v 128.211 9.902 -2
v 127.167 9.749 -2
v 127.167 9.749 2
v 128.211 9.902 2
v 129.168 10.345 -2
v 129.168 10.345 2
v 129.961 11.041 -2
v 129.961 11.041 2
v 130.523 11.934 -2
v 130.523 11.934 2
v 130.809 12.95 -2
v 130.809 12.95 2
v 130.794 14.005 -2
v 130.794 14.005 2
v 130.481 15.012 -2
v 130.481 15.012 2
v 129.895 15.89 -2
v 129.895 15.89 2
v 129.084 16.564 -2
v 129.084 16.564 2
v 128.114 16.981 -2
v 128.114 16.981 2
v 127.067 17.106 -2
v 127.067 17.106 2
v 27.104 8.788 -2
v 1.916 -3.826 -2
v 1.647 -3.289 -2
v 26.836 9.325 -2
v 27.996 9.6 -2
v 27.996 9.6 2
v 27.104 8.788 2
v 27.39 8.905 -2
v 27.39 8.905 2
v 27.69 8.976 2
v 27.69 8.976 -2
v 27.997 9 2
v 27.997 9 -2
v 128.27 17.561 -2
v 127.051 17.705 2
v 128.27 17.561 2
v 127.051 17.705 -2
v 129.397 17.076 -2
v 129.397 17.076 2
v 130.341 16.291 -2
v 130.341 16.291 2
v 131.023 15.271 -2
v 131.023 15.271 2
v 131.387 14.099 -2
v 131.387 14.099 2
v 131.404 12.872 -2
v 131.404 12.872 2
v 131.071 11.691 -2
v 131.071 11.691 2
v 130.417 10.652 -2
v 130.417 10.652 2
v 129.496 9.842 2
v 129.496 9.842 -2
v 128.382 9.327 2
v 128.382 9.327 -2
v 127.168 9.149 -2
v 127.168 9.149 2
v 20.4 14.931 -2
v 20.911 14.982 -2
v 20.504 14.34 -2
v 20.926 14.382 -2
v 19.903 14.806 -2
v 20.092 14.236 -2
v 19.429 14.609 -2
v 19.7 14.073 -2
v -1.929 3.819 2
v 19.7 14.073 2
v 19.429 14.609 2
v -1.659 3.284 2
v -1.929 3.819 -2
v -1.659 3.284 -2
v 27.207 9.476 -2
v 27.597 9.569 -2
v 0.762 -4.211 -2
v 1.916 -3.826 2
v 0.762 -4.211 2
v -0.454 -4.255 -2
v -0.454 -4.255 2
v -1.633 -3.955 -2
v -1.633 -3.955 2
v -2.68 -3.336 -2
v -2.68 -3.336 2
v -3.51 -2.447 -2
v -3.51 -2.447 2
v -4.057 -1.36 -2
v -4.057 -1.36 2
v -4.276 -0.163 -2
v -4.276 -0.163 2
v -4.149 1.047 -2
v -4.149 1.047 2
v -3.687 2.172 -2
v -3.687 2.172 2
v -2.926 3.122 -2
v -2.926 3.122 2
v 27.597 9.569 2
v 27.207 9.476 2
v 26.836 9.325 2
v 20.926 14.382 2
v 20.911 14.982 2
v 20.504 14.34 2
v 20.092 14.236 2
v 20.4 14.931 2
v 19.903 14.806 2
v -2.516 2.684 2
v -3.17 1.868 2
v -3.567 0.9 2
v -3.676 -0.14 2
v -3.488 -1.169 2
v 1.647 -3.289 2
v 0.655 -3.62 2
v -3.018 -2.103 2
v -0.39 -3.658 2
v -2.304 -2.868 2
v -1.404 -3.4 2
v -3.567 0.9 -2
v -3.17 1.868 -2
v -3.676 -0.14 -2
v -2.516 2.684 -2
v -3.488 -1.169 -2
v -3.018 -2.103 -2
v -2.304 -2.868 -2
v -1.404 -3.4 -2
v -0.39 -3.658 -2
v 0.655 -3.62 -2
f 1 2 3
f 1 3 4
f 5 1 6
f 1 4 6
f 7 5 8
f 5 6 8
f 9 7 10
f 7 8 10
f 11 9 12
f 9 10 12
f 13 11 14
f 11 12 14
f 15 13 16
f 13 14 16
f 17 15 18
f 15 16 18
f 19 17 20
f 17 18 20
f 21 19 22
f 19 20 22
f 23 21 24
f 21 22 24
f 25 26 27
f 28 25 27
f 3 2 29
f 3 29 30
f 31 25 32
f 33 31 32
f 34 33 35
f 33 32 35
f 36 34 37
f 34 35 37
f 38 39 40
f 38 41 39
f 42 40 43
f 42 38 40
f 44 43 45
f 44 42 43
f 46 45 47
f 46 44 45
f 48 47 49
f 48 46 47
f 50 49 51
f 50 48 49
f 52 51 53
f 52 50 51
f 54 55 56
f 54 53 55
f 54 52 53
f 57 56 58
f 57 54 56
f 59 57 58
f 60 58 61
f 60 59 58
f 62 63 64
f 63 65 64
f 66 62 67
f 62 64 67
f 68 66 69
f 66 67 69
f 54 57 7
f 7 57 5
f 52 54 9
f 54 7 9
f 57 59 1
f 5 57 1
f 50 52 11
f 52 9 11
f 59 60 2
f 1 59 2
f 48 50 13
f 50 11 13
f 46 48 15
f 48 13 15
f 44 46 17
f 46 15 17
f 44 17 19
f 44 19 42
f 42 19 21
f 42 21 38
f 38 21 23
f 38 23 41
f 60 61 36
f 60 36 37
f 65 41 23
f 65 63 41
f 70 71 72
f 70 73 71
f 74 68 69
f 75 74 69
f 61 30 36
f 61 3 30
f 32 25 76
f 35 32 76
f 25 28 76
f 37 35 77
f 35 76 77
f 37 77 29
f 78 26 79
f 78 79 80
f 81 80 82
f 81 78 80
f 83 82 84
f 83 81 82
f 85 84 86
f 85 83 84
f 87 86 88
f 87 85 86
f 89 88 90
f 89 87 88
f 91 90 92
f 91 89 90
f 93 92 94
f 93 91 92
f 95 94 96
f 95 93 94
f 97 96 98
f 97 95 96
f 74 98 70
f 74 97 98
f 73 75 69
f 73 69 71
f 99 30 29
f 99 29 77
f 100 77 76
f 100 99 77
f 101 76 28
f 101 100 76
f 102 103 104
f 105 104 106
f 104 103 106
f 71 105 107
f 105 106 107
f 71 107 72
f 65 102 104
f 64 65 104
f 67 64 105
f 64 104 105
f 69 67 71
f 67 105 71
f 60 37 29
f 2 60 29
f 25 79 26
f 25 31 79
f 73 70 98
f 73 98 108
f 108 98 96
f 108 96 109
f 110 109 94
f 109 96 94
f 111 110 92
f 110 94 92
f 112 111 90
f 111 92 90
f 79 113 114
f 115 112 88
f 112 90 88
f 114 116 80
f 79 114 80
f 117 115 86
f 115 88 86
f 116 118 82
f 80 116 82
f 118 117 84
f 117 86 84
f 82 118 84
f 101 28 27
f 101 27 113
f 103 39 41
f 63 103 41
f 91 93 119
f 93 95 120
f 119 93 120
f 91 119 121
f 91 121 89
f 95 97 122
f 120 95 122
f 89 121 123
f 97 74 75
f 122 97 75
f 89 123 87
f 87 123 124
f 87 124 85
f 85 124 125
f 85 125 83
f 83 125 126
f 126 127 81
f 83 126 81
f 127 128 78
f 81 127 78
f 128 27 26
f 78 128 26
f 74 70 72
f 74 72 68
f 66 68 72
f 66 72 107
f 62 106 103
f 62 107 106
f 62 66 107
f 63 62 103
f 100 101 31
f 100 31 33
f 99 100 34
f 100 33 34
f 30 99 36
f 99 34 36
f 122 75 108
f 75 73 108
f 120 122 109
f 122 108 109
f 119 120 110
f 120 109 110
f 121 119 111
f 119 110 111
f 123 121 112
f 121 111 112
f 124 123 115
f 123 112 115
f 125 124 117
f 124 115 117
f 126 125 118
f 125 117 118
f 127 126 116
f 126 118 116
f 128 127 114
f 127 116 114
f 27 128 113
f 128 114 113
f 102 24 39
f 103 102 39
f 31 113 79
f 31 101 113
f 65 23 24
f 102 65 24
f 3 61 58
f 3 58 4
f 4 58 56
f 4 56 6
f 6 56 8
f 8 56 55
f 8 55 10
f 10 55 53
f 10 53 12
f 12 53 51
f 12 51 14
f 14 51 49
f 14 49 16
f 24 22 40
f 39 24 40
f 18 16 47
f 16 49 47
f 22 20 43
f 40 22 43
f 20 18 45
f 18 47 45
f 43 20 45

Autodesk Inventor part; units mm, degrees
sketch "Skizzenpfad" plane through (0, 0, 0) normal (0, 0, 1) x (1, 0, 0)
  arc A0 (20.91835, 14.682051) -> (19.564749, 14.341157) centre (21, 11.5) ccw
  arc A1 (127.167049, 9.449131) -> (127.059003, 17.405564) centre (127.161065, 13.428) ccw
  arc A2 (27.996541, 9.299997) -> (26.970103, 9.056529) centre (28, 7) ccw
  arc A3 (-1.794064, 3.551446) -> (1.781665, -3.557682) centre (0, 0) ccw
  line L0 (-1.794064, 3.551446) -> (19.564749, 14.341157)
  line L1 (20.91835, 14.682051) -> (127.059003, 17.405564)
  line L2 (127.167049, 9.449131) -> (27.996541, 9.299997)
  line L3 (26.970103, 9.056529) -> (1.781665, -3.557682)
ref_plane "Querschnittsebene" through (19.564749, 14.341157, 0) normal (-0.8925758, -0.4508975, 0) x (0, 0, 1)
ref_plane "Arbeitsebene2" through (21, 11.5, 0) normal (-1, 0, 0) x (0, 0, 1)
ref_plane "Arbeitsebene3" through (127.161065, 13.428, 0) normal (-0.9467755, 0.3218947, 0) x (0, 0, 1)
ref_plane "Arbeitsebene4" through (0, 0, 0) normal (0.9748553, 0.2228388, 0) x (0, 0, 1)
sketch "Querschnitt" plane through (19.564749, 14.341157, 0) normal (-0.8925758, -0.4508975, 0) x (0, 0, 1)
  line L0 (-2, 0.3) -> (2, 0.3)
  line L1 (2, 0.3) -> (2, -0.3)
  line L2 (2, -0.3) -> (-2, -0.3)
  line L3 (-2, -0.3) -> (-2, 0.3)
  line L4 (-2, 0) -> (2, 0) construction
  point P0 (0, 0)
  point P1 (0, 0)
  dimension "d0" = 4
  dimension "d4" = 0.3
  dimension "d5" = 0.3
sweep "Riemen" add profiles "Querschnitt" path "Skizzenpfad"
equation "\"d0\" = da_B"
equation "\"d4\" = da_a"
equation "\"d5\" = da_a2"
equation "\"da_B\" = 4"
equation "\"da_pb\" = 2.5"
equation "\"da_L\" = 285"
equation "\"da_a\" = 0.3"
equation "\"da_S\" = 1.5"
equation "\"da_Beta\" = 20deg"
equation "\"da_Ht\" = 0.7"
equation "\"da_H\" = 1.3"
equation "\"da_a2\" = 0.3"
properties part number "Zahnriemen" material "Rubber"
